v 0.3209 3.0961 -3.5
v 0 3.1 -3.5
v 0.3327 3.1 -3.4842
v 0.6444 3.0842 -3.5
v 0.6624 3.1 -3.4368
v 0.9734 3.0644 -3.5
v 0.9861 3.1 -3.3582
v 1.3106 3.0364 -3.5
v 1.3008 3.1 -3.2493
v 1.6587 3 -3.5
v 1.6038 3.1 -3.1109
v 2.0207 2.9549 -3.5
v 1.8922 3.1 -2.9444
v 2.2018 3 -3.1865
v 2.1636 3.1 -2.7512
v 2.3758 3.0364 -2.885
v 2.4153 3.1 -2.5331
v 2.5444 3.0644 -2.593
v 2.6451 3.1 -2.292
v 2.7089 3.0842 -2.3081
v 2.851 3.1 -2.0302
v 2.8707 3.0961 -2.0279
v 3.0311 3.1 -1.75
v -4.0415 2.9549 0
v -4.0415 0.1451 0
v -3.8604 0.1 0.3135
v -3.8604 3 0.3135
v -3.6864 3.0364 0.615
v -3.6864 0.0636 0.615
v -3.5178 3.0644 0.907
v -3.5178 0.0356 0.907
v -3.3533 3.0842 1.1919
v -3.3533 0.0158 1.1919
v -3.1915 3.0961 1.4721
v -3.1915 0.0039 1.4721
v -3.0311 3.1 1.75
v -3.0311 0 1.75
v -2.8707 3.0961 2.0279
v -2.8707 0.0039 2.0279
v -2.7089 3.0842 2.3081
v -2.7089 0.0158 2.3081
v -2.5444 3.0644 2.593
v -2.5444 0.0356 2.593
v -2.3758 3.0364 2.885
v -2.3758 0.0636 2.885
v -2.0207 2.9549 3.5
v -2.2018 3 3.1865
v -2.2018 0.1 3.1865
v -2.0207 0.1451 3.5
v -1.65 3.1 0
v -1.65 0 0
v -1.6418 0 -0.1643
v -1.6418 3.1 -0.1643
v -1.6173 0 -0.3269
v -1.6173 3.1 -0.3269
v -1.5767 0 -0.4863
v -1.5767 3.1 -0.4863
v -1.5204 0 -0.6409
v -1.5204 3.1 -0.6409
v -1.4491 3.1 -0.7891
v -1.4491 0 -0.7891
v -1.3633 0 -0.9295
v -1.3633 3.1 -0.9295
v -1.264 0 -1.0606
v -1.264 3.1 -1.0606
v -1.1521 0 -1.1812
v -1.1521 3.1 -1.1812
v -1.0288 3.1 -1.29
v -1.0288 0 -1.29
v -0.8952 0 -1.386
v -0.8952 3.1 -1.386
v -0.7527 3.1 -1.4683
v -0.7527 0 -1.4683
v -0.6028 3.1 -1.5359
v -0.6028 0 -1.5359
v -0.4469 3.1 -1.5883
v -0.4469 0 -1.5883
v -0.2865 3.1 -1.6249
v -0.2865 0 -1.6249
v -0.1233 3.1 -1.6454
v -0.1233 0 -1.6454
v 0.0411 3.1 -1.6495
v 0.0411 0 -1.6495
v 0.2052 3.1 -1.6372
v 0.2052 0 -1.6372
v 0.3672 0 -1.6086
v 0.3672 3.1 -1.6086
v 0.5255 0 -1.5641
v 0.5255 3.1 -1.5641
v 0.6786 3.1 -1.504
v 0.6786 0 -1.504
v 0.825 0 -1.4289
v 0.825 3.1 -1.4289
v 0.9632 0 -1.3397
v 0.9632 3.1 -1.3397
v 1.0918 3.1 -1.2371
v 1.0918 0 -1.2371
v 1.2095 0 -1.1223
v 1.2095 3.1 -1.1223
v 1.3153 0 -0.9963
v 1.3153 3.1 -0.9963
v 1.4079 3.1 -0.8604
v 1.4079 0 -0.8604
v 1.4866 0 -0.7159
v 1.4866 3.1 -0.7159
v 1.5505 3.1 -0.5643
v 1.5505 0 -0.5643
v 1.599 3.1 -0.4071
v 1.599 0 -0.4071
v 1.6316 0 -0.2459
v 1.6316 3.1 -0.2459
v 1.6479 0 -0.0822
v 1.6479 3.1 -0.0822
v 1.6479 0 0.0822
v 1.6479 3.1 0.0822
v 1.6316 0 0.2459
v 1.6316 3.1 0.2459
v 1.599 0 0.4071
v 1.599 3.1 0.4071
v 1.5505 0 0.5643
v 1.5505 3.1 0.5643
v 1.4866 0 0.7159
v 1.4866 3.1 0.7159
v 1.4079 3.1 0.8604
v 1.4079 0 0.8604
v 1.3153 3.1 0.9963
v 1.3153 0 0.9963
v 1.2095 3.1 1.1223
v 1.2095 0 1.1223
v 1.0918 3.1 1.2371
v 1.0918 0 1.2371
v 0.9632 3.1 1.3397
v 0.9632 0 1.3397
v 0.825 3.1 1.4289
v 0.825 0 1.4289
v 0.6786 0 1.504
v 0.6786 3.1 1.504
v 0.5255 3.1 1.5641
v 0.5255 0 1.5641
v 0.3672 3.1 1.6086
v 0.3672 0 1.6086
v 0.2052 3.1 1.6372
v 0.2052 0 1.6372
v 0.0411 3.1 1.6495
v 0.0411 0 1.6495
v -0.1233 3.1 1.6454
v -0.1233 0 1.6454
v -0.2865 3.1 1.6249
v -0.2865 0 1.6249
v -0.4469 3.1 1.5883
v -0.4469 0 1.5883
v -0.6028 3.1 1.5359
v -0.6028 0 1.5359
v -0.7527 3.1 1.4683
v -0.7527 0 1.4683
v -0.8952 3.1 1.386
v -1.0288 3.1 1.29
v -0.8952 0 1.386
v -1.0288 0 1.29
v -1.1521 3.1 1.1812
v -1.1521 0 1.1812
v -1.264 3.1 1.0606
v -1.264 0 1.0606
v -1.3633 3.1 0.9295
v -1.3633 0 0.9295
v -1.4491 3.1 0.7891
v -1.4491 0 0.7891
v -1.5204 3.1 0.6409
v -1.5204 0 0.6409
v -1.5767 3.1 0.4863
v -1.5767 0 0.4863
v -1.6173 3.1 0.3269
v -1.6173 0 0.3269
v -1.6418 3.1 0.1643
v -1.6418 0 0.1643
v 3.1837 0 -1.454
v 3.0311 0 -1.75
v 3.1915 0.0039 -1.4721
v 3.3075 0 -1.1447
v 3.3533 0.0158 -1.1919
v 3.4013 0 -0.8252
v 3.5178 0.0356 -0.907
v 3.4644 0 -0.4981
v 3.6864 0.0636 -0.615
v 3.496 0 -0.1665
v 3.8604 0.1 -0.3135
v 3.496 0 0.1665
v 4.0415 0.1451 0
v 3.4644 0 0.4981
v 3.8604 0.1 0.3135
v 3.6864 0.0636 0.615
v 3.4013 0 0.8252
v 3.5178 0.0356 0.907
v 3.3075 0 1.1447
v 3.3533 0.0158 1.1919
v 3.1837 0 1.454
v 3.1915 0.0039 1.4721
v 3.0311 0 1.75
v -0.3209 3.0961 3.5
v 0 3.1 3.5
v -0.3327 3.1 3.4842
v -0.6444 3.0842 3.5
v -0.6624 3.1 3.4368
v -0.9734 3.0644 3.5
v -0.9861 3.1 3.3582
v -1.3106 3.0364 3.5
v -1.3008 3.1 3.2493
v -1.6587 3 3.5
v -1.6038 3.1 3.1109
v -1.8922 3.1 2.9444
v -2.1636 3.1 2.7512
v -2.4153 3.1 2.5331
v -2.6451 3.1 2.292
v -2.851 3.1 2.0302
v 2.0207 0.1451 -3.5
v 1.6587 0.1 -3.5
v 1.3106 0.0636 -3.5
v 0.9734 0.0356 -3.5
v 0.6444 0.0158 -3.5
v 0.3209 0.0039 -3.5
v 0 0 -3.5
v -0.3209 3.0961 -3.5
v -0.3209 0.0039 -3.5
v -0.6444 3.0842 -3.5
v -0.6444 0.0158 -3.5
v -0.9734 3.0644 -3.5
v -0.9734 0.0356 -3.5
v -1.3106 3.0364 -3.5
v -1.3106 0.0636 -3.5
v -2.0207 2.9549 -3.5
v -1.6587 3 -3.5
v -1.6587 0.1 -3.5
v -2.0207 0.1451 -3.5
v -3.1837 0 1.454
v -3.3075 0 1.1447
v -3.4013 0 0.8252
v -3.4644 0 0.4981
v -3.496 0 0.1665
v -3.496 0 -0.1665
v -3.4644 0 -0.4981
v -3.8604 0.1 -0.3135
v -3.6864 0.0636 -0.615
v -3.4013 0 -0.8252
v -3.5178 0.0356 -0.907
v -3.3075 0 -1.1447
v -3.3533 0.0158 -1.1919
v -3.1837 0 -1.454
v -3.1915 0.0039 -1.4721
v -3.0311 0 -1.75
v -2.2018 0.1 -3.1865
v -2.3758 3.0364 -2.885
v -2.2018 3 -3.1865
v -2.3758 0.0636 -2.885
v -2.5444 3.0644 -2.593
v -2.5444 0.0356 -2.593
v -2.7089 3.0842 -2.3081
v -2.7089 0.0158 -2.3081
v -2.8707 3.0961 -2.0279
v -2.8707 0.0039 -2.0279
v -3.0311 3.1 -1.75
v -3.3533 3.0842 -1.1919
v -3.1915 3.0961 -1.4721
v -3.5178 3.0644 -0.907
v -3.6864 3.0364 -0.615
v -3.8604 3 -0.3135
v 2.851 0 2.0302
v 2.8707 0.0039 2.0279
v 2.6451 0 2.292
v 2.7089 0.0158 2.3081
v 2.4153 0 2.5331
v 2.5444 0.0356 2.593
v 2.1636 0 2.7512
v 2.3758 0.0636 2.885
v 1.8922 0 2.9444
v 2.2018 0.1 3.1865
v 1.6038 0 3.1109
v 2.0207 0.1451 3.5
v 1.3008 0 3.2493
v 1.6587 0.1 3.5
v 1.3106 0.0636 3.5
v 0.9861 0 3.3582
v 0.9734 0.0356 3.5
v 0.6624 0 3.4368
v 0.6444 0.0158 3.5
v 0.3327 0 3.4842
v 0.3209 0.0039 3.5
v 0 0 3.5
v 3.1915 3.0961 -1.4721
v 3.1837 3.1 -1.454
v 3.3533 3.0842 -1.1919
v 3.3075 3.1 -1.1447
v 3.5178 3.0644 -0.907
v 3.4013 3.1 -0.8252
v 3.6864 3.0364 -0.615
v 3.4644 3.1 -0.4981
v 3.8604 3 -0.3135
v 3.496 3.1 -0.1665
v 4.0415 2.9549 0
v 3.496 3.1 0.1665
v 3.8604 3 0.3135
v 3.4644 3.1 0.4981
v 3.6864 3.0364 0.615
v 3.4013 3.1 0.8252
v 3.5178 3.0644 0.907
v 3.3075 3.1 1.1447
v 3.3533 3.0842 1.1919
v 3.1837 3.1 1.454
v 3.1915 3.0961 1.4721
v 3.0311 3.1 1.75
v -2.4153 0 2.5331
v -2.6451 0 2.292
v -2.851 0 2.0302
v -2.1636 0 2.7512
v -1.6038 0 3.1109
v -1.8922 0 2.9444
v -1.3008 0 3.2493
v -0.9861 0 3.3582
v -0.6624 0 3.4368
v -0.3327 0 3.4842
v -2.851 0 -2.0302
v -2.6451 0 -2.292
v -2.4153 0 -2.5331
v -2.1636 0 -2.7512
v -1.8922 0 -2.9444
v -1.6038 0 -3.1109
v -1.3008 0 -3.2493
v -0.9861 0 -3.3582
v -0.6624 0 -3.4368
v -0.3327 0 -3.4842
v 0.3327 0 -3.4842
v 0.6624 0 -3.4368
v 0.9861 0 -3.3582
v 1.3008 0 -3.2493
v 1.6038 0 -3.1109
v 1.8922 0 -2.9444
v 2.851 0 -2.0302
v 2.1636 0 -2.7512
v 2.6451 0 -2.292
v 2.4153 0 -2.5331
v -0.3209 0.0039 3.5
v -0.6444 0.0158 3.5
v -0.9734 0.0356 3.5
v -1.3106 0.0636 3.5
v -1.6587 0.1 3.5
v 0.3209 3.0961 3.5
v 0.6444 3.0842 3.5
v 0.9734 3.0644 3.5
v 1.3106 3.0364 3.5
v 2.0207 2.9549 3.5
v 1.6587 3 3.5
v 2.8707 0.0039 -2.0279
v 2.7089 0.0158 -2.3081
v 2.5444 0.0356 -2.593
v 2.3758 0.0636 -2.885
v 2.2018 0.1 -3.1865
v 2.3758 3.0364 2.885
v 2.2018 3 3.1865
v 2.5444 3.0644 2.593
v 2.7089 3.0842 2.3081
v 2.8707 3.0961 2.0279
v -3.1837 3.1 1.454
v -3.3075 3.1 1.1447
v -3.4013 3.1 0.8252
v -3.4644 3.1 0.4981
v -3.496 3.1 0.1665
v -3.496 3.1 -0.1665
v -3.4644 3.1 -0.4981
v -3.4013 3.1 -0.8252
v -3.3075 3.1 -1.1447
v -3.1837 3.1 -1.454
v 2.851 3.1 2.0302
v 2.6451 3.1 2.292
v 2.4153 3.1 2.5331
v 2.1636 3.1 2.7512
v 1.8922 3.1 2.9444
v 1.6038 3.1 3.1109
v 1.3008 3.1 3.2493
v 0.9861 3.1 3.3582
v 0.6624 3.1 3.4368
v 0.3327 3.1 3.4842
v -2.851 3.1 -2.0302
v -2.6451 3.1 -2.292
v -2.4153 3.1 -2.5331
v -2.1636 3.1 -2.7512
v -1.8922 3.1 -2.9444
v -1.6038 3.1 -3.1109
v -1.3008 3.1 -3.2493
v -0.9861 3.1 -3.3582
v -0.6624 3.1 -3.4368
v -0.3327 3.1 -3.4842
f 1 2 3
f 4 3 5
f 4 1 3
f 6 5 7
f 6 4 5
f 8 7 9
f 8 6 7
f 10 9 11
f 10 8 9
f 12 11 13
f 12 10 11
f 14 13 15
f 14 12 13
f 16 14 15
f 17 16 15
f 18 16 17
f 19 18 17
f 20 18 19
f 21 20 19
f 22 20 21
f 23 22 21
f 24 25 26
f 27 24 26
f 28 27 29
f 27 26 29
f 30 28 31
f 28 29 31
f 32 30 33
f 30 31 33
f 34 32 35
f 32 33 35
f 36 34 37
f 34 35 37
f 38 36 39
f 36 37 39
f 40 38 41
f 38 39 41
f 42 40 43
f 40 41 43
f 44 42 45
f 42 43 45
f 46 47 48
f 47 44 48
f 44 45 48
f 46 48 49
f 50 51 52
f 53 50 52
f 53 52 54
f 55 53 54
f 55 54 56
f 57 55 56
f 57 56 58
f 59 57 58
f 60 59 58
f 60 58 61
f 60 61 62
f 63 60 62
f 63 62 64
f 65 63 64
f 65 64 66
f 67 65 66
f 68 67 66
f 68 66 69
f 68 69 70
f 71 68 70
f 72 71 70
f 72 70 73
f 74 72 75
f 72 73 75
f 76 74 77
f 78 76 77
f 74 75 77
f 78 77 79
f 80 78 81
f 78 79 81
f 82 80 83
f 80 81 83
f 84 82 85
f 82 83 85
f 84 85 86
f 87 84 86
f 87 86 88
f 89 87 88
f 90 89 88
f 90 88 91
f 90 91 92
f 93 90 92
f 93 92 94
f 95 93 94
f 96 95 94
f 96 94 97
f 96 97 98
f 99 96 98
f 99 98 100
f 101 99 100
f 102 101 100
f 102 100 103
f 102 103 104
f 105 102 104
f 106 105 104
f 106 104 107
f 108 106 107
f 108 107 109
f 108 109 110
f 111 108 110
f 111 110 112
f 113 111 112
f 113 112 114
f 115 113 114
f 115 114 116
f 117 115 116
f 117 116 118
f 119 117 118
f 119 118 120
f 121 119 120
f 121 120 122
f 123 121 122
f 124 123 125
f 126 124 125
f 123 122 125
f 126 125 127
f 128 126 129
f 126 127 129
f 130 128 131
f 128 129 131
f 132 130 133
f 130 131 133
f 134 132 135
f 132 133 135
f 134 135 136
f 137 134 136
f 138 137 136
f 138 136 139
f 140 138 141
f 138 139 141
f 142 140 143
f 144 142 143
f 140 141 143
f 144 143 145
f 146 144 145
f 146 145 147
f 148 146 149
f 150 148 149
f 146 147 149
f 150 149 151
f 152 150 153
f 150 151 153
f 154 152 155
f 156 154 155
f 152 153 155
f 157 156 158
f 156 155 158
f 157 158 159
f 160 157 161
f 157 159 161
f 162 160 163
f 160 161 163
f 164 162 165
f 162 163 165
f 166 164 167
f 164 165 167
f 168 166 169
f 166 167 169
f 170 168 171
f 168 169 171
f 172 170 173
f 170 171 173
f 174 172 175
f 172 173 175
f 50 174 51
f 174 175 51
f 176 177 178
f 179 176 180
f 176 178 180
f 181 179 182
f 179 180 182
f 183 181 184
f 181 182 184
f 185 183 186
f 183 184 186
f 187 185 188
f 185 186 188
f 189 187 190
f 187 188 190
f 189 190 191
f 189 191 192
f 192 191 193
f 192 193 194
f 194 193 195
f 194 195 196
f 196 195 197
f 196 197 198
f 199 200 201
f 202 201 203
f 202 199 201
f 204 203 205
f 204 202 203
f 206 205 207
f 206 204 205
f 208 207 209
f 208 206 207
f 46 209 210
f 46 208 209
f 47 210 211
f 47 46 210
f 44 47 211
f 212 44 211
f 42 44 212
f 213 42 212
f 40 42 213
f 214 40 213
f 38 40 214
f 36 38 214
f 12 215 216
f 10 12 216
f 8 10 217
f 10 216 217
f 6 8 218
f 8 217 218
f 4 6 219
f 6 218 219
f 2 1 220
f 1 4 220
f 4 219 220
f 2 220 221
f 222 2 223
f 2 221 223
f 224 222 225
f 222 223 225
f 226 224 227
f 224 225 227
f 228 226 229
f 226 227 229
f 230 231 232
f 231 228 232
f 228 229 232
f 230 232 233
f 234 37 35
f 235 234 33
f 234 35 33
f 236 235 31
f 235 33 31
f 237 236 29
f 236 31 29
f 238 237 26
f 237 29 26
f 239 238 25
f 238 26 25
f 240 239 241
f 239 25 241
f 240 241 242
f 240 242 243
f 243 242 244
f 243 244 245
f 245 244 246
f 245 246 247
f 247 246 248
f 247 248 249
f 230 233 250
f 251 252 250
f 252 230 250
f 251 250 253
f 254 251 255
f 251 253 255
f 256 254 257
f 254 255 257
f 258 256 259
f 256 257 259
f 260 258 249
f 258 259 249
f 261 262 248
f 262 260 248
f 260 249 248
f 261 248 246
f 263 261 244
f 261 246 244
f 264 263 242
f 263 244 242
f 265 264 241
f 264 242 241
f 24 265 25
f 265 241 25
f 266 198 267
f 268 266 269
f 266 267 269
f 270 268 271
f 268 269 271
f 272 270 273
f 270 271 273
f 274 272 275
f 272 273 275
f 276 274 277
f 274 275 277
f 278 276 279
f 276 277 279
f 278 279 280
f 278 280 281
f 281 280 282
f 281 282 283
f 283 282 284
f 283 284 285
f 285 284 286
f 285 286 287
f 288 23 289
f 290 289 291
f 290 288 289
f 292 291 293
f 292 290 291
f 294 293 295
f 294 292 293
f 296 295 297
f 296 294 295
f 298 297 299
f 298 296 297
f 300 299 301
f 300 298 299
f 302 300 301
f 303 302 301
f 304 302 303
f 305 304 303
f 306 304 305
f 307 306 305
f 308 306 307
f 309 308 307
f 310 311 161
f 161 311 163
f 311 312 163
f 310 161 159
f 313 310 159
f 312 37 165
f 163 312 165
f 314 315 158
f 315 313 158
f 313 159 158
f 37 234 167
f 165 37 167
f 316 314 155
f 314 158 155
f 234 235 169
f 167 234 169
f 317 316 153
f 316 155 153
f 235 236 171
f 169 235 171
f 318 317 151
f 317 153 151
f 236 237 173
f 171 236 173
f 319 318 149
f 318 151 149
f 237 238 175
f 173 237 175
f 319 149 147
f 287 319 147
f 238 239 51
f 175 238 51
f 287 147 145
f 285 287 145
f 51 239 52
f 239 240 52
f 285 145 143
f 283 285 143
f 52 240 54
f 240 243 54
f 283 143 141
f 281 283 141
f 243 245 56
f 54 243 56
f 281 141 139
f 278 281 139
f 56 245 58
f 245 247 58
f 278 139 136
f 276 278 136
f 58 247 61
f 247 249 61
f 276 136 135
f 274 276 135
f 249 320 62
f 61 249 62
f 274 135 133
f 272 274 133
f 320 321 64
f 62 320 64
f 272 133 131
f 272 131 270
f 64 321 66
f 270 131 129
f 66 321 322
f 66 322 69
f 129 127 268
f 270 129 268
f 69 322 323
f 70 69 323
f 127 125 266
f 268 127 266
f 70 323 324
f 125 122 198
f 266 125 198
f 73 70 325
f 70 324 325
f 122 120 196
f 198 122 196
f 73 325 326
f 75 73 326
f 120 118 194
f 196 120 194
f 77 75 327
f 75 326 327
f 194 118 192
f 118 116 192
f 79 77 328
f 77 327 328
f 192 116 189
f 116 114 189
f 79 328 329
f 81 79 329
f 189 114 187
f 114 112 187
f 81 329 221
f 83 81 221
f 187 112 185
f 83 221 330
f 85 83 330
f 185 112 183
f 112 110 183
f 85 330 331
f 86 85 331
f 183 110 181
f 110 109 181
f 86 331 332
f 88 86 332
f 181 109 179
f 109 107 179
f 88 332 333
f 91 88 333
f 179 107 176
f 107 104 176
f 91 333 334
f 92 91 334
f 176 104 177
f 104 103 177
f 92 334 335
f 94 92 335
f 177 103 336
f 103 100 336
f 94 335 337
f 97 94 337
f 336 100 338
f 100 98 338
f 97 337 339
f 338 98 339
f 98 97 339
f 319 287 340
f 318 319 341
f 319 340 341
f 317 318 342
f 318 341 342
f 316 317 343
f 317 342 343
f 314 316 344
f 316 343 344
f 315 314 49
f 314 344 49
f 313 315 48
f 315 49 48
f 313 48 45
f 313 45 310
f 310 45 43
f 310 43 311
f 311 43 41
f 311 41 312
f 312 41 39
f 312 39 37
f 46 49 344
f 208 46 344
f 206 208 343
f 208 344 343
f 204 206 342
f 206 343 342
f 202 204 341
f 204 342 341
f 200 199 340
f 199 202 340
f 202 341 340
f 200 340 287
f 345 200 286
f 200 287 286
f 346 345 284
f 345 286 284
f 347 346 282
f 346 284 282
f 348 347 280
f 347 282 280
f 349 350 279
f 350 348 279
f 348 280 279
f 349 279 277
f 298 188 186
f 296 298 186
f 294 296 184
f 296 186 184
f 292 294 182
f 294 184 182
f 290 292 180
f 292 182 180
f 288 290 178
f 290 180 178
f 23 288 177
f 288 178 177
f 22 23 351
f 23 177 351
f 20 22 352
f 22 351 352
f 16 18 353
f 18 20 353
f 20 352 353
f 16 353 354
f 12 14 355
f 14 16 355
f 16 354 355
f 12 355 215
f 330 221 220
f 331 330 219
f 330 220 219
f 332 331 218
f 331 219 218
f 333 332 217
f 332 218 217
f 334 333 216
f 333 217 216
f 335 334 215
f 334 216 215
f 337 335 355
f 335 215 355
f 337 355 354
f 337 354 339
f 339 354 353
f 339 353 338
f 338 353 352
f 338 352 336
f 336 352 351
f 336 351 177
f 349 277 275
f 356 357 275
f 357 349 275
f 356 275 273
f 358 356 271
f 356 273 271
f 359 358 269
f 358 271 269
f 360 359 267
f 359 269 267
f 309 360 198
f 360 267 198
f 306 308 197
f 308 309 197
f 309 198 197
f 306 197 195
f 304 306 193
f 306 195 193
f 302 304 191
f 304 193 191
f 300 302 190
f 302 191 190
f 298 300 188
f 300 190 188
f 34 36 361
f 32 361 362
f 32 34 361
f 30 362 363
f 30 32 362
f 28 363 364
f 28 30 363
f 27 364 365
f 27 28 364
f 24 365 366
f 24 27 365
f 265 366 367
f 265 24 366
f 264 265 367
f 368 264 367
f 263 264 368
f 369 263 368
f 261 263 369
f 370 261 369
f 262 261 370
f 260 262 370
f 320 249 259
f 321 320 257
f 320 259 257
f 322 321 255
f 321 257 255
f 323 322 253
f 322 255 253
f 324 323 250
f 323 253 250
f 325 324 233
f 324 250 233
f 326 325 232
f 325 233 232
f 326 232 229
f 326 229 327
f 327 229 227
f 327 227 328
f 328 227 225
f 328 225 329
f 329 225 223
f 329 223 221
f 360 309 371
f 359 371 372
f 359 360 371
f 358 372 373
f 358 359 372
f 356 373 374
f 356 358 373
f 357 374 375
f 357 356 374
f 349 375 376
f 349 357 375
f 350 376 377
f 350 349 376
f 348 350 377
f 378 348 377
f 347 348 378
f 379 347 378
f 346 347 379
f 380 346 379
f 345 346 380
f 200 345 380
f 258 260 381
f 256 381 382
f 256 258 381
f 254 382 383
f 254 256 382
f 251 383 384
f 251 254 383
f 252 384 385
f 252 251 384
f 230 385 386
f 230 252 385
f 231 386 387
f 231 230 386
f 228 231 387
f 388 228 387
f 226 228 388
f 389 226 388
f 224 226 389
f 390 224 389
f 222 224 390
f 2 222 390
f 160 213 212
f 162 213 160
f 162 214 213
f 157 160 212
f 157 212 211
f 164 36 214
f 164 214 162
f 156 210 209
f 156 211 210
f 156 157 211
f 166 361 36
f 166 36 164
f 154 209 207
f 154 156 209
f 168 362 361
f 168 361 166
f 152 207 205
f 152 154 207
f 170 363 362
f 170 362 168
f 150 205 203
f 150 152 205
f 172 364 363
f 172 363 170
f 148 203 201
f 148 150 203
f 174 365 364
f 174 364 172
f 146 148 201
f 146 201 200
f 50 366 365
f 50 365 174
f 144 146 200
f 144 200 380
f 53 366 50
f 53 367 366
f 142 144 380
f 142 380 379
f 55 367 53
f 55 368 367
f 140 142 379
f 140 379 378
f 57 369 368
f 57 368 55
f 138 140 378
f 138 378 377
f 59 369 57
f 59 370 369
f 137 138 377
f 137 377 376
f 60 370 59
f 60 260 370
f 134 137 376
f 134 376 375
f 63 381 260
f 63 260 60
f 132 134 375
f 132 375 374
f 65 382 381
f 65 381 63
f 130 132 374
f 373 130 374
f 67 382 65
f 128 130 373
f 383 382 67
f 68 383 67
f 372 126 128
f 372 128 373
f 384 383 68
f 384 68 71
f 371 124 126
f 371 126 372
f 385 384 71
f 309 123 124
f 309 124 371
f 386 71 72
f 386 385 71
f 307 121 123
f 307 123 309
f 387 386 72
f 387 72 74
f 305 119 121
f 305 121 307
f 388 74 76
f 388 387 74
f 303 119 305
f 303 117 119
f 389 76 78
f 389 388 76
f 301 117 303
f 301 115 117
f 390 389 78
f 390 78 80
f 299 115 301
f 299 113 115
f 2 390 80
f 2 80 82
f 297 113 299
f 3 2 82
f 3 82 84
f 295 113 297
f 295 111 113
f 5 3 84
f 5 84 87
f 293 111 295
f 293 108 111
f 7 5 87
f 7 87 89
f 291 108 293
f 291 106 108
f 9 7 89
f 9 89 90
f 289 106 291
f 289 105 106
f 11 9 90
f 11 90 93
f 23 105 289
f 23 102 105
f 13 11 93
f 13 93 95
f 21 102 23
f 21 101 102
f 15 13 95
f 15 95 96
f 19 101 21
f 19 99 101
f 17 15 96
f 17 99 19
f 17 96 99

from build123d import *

# Parameters (mm, degrees)
EXTRUDE_1_DEPTH    = 3.1
HOLE_WIZARD_M4_1_D = 3.3


with BuildPart() as part:
    # 草图1 → 凸台-拉伸1 (new body)
    with BuildSketch(Plane(origin=(0, 0, 0), x_dir=(1, 0, 0), z_dir=(0, 1, 0))):
        Polygon((4.041451884, 0), (2.020725942, 3.5), (-2.020725942, 3.5), (-4.041451884, 0), (-2.020725942, -3.5), (2.020725942, -3.5), align=None)
    extrude(amount=EXTRUDE_1_DEPTH)

    # M4 螺纹孔1 (through all)
    with Locations(Plane(origin=(0, 3.1, 0), x_dir=(1, 0, 0), z_dir=(0, 1, 0))):
        with Locations((0, 0)):
            Hole(HOLE_WIZARD_M4_1_D / 2)

    # 草图5 → 切除-旋转1 (revolve, cut)
    with BuildSketch(Plane(origin=(0, 0, 0), x_dir=(0, 0, -1), z_dir=(1, 0, 0))):
        Polygon((-3.5, 0), (-4.387126804, 0.237704911), (-4.387126804, -0.855779568), align=None)
        Polygon((-4.387126804, 3.955779568), (-3.5, 3.1), (-4.387126804, 2.862295089), align=None)
    revolve(axis=Axis((0, 0, 0), (0, -1, 0)), mode=Mode.SUBTRACT)


solid = part.part
